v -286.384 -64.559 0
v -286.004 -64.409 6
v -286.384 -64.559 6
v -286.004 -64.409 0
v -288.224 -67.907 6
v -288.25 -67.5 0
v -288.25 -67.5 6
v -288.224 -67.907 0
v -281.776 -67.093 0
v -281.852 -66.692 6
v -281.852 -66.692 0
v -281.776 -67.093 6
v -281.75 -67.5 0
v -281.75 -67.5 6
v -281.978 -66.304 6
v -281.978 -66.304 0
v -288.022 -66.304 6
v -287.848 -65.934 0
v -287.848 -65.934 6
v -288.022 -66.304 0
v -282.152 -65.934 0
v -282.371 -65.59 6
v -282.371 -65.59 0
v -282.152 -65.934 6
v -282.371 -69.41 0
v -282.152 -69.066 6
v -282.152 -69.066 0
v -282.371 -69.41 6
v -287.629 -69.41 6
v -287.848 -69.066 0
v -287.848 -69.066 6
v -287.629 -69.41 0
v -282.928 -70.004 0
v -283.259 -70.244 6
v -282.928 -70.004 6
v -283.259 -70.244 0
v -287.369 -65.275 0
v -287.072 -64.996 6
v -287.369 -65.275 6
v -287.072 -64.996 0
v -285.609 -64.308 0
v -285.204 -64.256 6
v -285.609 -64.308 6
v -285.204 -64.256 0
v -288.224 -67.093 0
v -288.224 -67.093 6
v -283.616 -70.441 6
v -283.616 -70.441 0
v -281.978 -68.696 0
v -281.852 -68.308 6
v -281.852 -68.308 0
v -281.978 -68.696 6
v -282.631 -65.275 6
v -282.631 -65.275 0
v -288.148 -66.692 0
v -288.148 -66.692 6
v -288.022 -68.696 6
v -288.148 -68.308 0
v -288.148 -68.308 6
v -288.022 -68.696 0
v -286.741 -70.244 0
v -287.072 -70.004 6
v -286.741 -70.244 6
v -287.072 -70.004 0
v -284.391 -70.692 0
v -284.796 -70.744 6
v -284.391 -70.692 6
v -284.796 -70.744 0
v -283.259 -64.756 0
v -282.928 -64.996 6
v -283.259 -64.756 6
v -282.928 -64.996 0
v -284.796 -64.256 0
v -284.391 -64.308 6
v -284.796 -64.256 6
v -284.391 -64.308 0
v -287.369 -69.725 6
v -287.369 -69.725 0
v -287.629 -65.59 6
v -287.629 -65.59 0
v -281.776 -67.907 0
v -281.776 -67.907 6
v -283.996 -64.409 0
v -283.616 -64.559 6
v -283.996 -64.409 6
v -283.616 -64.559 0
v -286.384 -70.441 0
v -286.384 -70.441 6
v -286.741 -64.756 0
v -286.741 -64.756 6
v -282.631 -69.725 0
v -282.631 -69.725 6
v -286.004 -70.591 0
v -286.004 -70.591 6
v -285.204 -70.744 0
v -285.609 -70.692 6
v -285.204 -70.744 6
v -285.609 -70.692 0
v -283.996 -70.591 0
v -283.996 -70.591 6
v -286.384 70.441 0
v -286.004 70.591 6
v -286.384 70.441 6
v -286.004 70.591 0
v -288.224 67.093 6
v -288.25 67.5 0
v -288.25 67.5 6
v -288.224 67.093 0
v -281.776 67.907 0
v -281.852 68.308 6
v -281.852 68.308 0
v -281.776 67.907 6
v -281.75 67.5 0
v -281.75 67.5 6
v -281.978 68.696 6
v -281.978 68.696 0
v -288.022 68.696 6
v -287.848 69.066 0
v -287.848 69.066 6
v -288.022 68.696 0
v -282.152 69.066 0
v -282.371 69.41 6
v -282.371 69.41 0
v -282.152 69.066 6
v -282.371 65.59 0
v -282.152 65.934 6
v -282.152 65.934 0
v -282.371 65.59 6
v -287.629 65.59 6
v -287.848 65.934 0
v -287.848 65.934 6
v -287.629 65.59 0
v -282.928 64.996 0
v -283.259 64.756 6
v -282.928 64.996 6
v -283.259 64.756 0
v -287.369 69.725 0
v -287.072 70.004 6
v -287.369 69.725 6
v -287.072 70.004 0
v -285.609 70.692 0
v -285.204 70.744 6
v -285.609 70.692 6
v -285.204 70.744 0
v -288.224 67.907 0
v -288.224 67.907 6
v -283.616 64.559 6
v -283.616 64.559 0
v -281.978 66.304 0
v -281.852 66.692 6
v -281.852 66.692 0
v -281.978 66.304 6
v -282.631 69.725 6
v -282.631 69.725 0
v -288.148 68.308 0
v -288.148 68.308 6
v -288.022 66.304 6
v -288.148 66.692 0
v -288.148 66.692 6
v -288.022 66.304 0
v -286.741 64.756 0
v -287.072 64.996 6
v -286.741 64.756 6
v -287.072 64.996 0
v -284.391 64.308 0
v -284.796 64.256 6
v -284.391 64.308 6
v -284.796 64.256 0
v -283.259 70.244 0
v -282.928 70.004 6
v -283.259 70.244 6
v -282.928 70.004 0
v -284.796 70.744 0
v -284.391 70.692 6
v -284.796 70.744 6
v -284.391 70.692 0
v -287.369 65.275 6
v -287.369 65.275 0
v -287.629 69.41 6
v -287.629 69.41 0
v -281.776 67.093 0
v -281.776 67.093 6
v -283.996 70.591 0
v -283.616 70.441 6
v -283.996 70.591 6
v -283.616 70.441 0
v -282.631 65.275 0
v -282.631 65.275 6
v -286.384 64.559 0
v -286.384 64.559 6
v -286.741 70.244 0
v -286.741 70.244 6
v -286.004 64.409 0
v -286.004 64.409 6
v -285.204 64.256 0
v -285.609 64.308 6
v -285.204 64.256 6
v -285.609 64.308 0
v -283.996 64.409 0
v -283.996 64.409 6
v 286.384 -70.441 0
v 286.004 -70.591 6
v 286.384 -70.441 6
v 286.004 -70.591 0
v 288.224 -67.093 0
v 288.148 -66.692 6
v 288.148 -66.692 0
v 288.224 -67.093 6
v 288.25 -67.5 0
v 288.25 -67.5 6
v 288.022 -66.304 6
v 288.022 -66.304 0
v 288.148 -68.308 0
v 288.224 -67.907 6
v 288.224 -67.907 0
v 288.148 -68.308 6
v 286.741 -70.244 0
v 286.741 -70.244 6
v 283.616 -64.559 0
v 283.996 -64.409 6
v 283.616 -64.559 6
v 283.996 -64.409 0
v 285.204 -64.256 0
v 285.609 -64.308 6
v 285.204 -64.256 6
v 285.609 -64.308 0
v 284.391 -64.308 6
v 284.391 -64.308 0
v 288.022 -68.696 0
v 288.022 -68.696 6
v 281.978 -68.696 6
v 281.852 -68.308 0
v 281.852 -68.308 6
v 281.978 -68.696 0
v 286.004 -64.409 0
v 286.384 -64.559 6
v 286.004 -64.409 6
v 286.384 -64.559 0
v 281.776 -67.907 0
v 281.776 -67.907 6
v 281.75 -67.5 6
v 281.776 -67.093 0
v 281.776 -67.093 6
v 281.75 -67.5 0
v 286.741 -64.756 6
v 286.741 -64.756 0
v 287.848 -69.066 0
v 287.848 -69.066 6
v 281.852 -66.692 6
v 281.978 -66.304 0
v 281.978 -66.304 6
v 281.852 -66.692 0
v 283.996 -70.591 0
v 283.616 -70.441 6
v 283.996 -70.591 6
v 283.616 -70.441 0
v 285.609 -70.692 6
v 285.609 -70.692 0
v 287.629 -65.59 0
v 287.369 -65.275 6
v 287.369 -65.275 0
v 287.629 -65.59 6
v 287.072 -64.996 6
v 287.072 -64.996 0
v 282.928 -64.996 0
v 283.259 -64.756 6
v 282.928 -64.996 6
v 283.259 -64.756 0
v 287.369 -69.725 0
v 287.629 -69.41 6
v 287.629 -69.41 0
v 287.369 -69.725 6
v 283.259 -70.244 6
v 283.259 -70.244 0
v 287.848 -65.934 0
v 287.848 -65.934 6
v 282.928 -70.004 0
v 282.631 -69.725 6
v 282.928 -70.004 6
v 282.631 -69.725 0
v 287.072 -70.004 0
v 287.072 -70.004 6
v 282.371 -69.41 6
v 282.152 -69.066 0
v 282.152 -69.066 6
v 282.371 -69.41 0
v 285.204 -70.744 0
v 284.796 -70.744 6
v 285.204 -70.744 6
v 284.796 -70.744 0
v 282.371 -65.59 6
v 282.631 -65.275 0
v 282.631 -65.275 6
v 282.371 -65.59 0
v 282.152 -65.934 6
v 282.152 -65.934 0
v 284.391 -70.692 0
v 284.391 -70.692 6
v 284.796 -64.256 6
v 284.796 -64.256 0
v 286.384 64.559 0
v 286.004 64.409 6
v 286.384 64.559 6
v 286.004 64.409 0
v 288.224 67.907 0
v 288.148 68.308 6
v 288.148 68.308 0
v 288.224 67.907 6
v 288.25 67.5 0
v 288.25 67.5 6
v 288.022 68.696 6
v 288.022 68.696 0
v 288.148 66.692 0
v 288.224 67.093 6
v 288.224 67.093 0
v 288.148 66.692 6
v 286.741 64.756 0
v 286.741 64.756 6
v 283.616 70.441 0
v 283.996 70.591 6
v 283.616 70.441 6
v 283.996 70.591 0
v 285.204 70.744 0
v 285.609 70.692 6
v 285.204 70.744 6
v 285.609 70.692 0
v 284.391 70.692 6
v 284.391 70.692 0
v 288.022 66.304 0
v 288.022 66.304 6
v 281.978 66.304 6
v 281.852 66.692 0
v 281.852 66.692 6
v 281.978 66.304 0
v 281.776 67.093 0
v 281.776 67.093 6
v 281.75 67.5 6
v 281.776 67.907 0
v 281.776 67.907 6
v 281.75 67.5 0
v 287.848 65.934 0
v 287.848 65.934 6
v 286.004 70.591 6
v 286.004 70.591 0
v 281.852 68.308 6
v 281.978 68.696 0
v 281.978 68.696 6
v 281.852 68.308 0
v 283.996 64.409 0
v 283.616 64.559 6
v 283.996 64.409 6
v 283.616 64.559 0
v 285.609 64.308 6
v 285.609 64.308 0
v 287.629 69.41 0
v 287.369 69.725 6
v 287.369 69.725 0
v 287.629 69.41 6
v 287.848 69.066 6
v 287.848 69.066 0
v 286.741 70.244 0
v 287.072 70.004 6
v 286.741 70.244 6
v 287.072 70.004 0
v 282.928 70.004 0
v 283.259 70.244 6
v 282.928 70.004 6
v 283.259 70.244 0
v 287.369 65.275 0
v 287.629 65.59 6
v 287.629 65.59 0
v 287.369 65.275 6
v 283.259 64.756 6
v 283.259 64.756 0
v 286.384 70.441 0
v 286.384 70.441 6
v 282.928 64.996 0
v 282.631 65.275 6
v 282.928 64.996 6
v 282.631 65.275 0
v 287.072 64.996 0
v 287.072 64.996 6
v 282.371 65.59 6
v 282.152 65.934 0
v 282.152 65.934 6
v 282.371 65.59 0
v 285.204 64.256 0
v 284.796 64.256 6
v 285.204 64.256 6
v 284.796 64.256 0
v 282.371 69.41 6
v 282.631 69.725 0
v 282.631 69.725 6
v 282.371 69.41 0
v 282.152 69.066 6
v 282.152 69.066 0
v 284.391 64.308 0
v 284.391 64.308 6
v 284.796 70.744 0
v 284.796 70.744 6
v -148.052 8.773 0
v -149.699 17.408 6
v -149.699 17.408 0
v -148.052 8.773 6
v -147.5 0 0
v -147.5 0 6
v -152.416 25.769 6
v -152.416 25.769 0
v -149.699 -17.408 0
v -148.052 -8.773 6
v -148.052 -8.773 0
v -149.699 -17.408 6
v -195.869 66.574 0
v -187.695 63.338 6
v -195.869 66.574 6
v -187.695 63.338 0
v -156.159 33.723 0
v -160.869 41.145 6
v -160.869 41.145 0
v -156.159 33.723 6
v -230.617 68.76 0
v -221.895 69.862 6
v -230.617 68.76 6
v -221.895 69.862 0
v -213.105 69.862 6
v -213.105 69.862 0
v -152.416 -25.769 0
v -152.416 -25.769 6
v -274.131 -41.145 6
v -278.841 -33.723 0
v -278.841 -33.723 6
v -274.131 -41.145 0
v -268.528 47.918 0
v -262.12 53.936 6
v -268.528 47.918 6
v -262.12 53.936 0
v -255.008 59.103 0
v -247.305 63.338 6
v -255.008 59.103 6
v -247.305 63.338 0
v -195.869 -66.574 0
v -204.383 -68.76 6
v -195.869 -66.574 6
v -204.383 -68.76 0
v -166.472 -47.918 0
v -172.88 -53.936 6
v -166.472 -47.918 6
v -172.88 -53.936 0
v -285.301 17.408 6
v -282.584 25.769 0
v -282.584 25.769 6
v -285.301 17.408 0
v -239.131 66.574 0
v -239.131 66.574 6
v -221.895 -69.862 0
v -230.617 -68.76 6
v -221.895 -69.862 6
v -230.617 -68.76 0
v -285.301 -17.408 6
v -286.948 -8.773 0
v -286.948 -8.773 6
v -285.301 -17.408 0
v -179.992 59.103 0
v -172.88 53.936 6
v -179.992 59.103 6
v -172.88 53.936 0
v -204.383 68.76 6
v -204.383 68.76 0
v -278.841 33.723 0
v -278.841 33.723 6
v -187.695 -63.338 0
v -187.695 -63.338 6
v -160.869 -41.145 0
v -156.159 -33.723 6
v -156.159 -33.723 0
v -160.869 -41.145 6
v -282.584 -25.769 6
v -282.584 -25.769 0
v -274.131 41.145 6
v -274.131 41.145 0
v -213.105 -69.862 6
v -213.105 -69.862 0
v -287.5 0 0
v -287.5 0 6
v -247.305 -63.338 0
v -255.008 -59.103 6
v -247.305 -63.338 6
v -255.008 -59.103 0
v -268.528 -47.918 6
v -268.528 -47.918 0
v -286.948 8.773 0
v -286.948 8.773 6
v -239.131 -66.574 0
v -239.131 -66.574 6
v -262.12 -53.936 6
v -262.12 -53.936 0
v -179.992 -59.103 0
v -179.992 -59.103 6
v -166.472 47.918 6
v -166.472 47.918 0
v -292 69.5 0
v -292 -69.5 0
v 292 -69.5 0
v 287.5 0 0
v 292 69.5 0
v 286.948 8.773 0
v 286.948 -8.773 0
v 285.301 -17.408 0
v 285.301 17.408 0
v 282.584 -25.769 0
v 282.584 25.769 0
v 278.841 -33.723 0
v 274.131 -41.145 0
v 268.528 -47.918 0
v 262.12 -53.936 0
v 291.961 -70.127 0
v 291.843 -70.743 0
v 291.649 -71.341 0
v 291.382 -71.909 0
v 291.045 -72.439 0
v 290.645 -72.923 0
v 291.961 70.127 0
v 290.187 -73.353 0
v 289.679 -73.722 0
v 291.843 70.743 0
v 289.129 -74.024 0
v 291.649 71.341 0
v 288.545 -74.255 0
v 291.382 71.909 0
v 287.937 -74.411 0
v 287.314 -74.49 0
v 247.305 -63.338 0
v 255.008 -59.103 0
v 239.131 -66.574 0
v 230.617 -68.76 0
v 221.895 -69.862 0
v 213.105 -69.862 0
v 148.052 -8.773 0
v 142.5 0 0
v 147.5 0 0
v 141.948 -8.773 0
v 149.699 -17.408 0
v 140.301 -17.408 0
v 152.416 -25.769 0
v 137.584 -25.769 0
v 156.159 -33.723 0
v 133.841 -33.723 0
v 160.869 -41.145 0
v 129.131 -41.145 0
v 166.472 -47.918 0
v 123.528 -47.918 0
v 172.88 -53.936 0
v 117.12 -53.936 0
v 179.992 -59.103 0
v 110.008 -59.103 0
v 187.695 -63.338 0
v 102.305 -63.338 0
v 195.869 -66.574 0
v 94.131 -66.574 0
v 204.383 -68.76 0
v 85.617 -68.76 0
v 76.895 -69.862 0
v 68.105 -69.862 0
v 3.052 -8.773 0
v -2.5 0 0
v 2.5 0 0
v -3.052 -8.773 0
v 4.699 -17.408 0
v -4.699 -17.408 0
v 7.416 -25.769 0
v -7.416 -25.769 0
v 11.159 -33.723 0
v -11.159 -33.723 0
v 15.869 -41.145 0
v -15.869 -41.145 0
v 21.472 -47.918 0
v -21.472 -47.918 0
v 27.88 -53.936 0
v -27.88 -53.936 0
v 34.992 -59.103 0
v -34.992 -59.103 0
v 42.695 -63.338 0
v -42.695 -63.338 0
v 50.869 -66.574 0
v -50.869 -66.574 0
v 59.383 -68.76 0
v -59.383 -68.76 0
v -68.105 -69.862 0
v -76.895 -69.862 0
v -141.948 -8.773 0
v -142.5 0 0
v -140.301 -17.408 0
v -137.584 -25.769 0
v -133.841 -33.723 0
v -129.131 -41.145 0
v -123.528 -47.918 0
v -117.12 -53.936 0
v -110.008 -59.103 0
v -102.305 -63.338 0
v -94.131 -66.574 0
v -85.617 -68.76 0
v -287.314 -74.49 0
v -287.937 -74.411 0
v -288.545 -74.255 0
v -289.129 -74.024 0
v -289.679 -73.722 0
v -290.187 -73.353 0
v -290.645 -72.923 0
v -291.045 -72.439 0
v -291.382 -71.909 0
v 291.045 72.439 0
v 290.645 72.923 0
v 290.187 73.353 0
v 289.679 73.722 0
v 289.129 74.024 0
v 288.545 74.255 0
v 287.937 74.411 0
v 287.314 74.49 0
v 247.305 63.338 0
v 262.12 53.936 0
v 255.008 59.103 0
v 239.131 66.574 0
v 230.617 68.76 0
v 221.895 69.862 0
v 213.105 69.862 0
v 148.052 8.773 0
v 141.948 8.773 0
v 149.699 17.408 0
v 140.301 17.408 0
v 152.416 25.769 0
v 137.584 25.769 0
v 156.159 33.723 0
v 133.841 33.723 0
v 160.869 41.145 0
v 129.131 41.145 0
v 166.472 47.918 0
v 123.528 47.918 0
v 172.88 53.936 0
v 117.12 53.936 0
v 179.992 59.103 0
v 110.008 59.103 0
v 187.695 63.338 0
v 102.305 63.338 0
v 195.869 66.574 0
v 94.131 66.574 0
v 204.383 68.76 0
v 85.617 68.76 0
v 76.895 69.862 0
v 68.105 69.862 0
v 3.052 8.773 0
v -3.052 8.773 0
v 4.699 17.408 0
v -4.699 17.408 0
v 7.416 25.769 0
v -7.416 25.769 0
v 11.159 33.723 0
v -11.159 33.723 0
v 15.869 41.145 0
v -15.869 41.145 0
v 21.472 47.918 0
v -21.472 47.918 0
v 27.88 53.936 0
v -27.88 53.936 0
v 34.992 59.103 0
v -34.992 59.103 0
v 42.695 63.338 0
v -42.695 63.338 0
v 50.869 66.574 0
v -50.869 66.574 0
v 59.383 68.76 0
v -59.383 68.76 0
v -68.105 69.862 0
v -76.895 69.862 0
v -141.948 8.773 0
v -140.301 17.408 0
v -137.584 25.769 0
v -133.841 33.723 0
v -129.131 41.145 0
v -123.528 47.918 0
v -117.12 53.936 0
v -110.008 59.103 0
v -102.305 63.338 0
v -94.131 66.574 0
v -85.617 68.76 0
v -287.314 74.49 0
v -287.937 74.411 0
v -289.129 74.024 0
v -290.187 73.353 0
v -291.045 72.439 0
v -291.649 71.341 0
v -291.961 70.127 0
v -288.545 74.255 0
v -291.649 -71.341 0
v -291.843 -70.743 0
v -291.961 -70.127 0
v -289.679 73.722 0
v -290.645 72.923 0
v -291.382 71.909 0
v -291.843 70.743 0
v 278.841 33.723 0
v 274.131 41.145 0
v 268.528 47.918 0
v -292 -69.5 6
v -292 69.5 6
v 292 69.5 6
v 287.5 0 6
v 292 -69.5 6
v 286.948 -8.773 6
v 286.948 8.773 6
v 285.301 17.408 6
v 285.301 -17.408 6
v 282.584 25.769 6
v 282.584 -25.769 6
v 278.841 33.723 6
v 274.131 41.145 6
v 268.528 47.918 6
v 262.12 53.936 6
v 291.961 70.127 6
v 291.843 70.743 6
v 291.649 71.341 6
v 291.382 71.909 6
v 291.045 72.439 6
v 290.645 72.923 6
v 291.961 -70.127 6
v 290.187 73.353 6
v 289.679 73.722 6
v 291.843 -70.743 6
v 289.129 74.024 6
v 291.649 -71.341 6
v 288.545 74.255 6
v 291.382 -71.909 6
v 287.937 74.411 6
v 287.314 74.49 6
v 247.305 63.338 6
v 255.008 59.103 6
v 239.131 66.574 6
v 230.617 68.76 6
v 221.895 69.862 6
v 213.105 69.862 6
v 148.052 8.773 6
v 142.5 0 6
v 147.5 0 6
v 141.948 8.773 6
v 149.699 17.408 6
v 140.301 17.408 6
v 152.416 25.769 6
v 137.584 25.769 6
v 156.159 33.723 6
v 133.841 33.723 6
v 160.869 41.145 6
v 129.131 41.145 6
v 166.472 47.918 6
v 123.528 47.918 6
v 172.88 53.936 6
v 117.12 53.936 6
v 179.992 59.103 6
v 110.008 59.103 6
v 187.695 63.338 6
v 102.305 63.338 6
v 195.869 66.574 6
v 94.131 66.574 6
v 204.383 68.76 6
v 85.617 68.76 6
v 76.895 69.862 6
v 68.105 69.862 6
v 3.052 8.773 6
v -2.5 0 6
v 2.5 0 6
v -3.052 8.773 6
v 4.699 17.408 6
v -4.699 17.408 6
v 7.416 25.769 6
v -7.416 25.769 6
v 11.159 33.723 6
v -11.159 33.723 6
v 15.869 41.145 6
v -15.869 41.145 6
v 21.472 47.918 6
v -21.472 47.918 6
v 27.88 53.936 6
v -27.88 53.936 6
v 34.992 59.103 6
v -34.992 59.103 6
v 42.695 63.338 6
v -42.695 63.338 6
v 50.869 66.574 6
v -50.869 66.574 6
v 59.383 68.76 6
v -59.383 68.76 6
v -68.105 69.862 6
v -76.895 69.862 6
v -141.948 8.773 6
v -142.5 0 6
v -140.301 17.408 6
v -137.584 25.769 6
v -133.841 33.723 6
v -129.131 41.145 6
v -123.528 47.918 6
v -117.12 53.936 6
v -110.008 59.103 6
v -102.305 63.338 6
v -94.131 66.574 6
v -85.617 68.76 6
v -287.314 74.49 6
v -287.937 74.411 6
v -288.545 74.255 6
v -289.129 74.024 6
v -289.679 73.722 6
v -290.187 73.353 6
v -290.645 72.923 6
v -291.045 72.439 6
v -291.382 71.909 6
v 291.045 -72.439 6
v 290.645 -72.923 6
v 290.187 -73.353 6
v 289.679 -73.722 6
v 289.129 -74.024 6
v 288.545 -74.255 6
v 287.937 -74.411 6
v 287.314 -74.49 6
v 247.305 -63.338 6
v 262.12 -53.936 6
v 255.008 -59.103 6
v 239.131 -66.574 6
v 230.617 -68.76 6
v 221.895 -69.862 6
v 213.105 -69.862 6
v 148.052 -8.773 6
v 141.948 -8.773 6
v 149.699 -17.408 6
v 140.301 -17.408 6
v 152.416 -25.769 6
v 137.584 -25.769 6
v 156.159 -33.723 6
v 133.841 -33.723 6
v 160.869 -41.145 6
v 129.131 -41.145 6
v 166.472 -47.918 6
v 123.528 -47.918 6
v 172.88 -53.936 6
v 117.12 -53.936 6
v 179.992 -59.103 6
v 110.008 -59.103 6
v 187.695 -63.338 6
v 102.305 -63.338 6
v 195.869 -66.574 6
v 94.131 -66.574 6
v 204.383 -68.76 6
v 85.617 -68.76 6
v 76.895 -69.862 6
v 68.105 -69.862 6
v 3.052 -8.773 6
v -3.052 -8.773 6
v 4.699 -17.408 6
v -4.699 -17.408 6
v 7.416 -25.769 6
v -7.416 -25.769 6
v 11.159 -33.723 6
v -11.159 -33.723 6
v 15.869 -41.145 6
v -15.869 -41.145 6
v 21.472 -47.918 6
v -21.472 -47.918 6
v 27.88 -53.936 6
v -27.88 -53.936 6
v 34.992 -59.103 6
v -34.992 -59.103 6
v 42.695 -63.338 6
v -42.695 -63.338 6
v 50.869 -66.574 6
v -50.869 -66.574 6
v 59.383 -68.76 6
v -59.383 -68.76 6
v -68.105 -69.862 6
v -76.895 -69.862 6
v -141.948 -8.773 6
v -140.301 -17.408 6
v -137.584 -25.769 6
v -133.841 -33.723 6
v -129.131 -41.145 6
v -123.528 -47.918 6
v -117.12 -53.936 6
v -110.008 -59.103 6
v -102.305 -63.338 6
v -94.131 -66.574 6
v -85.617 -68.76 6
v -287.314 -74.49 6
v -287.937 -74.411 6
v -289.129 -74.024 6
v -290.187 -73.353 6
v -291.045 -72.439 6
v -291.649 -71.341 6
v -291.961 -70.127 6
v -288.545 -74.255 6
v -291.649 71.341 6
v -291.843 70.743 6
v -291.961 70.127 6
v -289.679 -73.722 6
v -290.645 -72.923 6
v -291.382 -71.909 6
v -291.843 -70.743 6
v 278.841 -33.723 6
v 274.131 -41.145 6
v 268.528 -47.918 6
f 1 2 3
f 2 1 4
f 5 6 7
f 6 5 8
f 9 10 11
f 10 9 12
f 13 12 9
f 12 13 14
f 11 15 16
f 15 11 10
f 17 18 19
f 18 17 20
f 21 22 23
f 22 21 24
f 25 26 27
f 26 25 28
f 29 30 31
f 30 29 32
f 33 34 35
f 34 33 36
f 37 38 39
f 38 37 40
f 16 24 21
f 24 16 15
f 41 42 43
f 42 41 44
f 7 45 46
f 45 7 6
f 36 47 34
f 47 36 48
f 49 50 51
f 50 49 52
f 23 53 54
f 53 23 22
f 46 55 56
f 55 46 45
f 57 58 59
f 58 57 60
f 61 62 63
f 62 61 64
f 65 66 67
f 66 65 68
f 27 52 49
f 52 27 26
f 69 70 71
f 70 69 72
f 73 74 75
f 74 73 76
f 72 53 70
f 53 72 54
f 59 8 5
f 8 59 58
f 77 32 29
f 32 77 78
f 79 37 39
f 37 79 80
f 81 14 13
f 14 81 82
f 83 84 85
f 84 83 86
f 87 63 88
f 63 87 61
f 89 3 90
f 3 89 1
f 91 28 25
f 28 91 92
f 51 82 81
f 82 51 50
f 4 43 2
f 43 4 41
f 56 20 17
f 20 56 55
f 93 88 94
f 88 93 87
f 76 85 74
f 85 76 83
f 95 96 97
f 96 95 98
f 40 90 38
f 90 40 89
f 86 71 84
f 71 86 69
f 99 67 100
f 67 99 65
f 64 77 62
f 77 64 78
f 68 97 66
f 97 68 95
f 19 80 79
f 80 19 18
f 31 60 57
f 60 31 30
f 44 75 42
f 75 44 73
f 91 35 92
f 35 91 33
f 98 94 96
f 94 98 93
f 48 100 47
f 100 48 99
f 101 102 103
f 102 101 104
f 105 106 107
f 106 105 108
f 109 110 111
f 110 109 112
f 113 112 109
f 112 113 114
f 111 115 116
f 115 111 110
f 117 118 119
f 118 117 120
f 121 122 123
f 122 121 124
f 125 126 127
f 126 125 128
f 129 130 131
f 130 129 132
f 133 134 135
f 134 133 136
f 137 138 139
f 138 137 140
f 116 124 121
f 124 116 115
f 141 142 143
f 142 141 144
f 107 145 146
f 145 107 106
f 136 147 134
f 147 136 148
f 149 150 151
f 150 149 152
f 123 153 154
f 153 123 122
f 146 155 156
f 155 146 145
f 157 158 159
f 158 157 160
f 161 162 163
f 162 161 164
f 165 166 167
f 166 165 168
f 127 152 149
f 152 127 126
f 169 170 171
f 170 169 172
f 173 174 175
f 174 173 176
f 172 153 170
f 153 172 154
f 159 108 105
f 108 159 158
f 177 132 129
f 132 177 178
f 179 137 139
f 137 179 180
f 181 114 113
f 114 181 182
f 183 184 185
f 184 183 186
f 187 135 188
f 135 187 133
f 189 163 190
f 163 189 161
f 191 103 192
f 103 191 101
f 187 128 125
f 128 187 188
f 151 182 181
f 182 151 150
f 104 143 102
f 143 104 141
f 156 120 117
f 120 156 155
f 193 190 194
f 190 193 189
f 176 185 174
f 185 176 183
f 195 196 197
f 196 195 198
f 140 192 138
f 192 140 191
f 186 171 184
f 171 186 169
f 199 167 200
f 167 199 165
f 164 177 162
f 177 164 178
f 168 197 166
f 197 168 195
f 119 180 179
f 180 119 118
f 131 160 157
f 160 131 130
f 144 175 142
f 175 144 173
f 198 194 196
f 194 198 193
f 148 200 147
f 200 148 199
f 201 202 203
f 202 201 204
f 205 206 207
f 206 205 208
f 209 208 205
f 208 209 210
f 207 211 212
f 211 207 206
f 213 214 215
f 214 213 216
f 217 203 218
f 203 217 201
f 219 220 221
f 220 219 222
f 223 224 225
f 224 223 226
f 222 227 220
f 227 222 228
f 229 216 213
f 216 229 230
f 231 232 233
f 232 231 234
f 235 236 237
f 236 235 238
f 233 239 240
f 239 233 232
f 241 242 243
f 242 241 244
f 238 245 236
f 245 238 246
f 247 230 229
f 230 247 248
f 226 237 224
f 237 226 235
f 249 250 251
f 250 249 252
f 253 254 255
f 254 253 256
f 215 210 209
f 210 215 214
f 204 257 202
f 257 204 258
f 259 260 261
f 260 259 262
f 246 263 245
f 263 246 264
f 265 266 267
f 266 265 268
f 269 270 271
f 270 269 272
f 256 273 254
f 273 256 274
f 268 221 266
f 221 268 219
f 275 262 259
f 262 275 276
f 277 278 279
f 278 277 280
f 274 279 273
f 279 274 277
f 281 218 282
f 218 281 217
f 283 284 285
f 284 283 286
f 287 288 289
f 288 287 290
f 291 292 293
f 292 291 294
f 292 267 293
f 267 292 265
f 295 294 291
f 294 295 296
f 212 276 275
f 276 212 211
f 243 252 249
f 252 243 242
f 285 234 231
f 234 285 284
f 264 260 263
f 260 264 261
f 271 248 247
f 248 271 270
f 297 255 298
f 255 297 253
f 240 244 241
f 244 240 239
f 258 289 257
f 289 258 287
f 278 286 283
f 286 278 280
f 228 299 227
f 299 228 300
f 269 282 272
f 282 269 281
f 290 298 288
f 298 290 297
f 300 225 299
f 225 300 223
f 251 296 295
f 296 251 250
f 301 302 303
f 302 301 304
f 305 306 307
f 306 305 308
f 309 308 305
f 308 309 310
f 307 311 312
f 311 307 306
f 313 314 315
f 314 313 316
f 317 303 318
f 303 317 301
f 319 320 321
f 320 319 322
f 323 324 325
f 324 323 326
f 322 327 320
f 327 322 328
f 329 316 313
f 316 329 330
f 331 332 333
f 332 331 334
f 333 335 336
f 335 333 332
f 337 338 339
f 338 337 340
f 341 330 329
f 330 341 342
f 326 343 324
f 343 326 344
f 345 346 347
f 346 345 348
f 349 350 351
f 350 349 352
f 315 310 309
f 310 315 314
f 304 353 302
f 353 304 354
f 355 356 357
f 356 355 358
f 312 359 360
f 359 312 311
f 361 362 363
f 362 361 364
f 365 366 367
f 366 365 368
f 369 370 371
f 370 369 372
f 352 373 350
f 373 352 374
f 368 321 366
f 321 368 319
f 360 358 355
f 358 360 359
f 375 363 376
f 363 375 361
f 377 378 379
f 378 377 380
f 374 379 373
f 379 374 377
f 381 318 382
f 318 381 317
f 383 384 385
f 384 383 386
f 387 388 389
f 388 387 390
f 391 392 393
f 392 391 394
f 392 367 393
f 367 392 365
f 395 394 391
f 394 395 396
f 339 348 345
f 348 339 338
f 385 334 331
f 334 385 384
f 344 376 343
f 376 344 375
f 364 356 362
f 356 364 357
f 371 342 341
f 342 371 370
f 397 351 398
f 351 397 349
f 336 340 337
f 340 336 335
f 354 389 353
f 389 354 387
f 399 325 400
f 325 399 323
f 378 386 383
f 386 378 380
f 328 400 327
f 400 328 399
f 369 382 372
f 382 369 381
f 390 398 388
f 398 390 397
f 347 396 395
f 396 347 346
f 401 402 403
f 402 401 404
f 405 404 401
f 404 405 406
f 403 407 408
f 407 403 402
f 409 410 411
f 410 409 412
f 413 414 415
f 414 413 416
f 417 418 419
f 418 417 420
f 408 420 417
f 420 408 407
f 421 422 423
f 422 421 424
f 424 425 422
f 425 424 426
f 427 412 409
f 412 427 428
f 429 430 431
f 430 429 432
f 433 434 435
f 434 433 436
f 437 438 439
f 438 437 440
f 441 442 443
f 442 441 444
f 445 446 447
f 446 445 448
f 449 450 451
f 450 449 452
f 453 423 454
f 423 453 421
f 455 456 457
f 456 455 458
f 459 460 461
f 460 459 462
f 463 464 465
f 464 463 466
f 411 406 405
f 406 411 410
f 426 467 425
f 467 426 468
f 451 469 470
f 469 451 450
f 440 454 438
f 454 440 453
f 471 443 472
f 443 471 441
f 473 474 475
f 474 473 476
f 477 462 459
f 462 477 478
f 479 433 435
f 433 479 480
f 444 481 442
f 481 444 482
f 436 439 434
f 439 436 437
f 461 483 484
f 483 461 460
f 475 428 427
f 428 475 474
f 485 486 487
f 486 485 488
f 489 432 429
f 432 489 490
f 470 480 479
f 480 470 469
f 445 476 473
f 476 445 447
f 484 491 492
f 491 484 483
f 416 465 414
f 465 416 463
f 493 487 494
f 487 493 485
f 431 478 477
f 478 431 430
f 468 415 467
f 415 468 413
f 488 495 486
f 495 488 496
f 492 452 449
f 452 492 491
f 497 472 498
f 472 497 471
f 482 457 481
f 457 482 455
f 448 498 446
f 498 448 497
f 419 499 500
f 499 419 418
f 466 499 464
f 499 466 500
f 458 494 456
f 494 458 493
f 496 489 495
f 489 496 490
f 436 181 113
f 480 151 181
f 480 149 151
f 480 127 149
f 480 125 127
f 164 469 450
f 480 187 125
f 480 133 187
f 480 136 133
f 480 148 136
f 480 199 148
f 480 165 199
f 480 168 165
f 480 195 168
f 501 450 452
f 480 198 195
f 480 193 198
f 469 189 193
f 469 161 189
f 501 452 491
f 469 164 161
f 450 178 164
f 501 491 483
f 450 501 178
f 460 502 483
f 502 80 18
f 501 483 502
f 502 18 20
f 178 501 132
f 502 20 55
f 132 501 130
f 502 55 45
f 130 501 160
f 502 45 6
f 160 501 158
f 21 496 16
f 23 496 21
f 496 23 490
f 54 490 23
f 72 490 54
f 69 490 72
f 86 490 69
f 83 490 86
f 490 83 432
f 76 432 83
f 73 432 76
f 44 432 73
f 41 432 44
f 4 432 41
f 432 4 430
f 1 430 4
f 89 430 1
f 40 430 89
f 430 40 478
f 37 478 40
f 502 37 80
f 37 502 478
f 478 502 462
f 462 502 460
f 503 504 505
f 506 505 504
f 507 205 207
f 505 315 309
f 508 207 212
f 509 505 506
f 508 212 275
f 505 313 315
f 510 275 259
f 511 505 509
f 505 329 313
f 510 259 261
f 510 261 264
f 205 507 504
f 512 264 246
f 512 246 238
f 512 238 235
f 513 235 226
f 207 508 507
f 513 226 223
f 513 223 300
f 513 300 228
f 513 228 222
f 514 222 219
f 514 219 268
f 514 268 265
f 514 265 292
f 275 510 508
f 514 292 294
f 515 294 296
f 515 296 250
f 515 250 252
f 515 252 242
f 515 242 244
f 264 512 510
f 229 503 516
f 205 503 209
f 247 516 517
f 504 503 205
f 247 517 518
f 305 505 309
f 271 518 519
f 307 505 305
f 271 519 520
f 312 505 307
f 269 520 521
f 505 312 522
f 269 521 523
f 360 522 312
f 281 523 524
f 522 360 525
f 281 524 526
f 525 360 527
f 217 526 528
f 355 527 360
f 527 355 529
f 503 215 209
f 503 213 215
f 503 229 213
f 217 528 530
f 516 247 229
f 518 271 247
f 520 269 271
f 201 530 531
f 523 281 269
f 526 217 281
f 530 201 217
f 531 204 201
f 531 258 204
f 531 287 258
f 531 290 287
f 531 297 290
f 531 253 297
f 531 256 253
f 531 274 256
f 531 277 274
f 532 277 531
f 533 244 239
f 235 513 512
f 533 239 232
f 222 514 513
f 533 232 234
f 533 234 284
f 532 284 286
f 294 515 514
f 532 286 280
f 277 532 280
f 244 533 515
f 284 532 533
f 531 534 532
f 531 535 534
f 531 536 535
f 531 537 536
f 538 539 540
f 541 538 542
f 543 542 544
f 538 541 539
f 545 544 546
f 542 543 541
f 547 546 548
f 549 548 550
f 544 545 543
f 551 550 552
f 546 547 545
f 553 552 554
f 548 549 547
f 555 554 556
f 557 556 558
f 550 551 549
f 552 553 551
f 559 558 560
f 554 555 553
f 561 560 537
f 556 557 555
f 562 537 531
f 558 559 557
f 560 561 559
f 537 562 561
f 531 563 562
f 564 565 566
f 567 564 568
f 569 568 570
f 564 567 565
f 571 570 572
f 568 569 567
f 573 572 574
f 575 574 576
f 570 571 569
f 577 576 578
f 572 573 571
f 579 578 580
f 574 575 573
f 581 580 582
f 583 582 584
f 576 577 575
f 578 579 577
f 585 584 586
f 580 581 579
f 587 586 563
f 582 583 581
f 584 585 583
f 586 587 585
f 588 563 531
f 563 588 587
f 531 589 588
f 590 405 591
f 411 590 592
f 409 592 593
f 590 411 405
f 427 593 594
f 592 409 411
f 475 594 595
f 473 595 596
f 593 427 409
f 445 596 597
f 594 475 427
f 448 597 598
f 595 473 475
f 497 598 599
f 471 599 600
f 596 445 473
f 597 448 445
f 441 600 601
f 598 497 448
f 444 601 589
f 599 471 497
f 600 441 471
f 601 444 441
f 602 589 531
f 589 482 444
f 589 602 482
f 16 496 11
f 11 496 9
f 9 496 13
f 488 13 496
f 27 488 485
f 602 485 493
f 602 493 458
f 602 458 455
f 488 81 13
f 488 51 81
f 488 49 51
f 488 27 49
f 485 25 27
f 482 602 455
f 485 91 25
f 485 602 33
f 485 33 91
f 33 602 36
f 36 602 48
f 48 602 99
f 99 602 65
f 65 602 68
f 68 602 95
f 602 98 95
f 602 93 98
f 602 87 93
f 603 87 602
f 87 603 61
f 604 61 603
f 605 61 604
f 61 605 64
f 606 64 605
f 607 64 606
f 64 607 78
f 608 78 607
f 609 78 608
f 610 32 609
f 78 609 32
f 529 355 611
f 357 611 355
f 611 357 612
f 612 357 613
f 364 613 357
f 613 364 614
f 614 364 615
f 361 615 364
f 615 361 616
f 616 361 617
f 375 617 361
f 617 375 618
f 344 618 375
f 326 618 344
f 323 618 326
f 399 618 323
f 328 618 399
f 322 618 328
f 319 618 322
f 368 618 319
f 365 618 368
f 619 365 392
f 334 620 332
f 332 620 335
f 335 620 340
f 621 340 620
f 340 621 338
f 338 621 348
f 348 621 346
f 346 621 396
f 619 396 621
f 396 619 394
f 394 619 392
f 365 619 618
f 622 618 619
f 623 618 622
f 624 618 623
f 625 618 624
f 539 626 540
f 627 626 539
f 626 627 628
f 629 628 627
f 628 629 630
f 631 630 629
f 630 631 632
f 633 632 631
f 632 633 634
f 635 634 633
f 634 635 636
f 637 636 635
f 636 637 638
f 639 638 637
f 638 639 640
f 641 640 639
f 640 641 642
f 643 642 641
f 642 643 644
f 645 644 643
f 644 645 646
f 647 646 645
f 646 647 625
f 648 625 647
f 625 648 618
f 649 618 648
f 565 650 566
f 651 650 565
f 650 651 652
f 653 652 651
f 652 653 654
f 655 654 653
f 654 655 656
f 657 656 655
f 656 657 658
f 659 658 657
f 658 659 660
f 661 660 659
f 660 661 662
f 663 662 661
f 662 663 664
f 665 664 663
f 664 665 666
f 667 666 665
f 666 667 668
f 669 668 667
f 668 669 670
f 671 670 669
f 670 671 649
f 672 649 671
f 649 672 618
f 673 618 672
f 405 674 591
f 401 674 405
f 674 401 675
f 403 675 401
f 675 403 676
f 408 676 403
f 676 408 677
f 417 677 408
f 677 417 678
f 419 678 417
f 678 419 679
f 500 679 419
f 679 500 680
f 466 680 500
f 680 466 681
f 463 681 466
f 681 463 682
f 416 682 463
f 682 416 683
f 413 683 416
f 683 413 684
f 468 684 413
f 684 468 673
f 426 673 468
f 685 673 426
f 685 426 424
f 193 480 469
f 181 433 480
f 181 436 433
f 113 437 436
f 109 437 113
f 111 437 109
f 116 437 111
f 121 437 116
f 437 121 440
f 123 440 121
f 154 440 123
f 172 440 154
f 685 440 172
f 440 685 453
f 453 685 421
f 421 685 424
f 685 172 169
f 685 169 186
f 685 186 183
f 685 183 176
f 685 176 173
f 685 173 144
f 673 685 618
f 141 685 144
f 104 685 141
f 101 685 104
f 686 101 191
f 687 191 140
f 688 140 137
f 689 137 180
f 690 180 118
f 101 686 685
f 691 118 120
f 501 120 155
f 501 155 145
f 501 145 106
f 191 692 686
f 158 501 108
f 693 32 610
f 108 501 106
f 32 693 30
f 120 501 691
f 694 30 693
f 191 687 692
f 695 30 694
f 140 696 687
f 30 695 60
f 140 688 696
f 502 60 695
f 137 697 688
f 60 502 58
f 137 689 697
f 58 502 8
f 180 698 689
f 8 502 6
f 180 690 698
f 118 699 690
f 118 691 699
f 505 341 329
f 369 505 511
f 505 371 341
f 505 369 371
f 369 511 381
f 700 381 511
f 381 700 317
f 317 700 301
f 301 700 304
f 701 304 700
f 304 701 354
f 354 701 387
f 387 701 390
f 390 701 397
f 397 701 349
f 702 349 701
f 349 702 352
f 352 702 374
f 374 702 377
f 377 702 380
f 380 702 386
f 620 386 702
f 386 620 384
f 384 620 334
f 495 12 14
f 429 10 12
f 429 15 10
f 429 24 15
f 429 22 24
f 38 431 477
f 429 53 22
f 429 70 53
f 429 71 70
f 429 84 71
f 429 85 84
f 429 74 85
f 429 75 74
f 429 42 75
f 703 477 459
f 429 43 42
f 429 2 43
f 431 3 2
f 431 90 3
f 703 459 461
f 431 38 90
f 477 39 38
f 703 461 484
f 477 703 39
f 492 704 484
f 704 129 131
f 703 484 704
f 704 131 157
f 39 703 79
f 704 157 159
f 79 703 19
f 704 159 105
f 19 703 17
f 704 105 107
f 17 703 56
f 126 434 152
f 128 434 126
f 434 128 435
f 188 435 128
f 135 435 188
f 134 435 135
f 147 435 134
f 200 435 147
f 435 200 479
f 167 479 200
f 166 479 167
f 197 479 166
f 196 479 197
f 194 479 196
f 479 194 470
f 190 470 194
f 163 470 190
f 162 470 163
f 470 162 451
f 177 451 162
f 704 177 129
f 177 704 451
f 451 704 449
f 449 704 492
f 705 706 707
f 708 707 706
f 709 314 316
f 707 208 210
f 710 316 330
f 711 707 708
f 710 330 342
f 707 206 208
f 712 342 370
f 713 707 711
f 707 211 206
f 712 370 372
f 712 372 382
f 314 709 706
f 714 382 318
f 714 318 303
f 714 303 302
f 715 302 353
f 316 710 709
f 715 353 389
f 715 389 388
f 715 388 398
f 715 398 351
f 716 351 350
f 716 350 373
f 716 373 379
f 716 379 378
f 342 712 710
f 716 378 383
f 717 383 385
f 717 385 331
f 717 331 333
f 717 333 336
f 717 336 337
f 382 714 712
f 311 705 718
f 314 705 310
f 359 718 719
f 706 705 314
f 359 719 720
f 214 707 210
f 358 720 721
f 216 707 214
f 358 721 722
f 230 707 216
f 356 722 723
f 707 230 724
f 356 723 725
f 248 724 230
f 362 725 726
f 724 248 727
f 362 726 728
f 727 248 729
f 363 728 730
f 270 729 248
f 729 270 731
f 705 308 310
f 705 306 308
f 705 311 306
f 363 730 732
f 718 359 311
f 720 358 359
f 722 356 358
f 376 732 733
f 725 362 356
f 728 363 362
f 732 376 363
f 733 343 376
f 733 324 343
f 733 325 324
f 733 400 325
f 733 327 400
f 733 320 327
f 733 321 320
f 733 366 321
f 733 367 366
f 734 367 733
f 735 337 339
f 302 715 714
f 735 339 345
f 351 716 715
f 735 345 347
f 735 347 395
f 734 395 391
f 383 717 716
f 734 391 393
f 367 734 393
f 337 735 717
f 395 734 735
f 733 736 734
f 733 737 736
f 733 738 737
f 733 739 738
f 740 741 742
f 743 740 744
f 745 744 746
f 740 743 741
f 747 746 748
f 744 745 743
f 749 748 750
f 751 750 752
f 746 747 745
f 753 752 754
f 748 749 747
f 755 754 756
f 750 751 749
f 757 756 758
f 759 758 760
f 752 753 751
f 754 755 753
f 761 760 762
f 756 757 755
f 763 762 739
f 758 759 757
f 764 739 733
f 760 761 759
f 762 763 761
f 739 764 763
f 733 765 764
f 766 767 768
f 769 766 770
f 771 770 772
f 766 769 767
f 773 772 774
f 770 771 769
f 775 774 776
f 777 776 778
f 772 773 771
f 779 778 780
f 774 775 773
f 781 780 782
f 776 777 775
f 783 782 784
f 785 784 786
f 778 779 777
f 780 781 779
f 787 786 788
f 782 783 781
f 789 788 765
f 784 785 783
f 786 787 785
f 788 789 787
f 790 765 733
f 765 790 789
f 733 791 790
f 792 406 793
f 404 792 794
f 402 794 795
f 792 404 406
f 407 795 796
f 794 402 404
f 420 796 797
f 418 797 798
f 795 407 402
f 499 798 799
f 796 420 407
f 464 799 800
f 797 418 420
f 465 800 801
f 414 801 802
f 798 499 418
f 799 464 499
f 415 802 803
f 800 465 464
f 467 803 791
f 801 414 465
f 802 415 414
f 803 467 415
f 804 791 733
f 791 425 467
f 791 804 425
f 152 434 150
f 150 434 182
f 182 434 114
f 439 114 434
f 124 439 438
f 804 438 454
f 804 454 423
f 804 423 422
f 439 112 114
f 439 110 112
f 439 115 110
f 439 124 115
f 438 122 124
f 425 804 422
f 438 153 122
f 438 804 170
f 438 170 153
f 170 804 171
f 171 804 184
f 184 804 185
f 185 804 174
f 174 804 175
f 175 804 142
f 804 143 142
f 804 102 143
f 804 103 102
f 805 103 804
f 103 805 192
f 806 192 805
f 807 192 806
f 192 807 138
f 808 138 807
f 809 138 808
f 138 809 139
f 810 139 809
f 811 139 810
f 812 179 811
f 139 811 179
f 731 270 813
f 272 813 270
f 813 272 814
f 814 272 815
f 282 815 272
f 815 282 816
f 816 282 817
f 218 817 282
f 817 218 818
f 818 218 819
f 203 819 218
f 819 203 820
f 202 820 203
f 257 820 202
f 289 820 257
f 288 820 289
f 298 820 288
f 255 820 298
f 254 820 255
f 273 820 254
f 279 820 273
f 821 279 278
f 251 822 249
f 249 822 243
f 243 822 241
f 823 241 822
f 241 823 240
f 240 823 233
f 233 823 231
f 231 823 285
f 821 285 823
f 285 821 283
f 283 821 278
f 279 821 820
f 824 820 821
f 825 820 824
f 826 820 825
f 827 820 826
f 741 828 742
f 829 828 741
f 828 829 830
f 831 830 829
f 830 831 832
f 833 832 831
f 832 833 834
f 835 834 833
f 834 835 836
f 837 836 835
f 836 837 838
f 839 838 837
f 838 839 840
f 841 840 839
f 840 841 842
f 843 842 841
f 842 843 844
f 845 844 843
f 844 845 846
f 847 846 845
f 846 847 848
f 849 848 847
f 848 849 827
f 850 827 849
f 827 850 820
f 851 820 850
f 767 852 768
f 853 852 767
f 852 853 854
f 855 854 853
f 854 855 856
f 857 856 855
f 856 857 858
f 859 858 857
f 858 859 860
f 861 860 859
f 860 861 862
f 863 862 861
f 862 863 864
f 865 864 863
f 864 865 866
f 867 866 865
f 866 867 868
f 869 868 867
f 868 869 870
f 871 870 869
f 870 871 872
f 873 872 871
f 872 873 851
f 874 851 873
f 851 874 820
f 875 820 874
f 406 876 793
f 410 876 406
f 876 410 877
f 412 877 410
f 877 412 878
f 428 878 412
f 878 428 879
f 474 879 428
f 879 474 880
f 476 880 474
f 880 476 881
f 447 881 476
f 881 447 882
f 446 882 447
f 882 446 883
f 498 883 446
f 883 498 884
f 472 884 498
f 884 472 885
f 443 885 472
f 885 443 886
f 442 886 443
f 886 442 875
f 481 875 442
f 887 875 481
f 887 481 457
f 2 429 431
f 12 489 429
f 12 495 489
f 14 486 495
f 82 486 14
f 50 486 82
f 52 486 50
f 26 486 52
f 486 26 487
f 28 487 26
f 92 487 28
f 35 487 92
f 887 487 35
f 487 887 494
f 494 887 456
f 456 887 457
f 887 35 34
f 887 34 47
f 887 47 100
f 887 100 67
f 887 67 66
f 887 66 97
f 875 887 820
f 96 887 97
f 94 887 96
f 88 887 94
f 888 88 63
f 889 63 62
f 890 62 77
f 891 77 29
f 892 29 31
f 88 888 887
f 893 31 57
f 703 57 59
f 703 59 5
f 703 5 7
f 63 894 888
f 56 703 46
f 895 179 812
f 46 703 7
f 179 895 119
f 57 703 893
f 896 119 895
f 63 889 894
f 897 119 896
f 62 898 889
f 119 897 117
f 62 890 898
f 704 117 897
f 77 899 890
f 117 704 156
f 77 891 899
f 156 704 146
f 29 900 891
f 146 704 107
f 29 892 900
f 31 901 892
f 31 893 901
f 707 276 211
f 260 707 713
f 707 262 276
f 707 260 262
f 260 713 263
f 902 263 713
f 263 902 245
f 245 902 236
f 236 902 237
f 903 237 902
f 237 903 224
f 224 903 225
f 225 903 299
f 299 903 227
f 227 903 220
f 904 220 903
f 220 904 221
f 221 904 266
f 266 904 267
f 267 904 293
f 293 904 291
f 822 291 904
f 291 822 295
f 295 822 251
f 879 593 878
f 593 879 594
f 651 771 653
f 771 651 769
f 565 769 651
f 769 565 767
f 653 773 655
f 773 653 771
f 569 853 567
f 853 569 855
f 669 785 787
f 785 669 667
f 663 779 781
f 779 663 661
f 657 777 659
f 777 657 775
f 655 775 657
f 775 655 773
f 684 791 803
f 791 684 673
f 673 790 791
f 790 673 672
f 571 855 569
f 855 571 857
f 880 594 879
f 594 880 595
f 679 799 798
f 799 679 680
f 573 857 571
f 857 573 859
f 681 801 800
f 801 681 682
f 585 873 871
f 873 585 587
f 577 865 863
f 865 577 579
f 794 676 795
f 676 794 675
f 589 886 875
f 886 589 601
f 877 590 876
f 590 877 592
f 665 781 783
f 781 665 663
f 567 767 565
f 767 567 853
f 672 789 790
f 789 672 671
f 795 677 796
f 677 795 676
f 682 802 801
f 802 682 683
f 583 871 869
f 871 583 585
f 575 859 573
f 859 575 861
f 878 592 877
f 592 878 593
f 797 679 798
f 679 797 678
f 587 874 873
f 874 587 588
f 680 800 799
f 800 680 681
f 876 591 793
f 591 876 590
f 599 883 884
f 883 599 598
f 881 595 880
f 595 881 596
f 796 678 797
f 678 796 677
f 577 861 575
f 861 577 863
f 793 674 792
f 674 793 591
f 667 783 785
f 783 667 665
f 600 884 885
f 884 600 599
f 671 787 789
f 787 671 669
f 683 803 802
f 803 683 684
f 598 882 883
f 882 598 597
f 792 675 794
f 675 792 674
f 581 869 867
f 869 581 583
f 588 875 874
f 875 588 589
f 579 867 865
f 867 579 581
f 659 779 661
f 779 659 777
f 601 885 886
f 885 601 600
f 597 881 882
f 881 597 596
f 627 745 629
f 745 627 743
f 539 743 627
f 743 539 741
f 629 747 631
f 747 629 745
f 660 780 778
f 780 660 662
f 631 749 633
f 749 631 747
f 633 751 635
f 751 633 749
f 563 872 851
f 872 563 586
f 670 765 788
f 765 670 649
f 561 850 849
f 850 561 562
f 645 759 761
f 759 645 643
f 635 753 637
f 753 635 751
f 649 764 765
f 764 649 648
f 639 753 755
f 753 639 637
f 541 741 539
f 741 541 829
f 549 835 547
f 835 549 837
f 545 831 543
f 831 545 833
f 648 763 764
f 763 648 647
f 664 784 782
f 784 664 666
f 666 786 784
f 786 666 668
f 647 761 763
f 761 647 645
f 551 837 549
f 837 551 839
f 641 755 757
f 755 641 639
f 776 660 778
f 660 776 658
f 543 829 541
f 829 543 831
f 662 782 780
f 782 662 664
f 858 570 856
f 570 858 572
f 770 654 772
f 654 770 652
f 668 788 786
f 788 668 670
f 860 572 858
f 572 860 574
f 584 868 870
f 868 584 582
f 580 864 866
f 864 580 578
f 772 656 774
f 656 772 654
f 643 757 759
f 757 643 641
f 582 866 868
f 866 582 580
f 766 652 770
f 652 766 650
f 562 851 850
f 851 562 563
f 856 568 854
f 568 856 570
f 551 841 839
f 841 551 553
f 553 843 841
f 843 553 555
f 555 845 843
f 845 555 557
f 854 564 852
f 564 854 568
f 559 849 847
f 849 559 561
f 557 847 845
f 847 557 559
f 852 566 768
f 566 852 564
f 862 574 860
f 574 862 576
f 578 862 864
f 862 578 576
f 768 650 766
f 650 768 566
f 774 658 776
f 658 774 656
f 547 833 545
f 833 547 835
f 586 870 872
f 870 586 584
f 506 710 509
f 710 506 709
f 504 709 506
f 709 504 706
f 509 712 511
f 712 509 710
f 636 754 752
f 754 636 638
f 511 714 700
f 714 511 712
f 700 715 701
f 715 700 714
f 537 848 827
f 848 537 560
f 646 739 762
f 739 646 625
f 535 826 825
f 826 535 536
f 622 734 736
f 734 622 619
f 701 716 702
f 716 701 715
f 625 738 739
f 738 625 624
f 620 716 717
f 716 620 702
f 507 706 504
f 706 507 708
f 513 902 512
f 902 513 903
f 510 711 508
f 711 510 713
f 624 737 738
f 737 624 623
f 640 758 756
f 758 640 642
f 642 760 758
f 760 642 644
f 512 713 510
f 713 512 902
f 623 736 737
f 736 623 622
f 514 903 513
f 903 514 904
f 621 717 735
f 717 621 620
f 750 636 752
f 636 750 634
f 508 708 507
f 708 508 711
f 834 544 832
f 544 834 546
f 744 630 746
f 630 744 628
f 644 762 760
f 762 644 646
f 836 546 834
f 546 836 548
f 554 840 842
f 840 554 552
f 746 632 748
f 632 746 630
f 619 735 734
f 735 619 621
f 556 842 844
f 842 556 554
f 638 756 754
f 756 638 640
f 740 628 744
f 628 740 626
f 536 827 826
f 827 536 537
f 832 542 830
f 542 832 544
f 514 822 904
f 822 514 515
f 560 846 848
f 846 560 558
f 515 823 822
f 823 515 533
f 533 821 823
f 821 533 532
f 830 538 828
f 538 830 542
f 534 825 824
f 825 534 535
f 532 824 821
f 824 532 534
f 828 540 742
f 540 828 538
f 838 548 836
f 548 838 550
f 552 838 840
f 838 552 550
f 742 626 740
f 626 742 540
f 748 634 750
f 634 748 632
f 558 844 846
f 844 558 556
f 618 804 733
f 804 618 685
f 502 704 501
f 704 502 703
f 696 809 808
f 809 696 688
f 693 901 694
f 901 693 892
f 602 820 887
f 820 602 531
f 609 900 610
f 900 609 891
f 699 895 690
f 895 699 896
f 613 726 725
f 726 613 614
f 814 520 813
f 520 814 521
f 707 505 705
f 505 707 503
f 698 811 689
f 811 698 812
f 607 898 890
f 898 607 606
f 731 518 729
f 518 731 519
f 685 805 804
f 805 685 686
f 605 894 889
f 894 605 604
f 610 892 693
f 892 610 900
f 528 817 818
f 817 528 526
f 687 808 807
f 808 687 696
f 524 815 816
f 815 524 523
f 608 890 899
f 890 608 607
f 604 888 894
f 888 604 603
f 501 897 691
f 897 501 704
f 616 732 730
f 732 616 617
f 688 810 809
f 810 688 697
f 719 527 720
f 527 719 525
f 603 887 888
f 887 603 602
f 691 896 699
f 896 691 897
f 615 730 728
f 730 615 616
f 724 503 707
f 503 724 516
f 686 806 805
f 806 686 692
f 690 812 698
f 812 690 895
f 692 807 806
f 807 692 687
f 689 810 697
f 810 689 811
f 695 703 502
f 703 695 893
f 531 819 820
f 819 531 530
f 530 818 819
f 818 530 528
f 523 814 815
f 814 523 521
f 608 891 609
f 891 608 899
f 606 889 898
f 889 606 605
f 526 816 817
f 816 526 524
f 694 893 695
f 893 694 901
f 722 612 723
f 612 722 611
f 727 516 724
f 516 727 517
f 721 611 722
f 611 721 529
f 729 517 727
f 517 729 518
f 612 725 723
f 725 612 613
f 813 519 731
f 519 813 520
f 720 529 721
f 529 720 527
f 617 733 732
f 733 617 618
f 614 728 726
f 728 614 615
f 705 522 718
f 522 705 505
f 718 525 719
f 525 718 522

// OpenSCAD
$fn = 50;

difference() {
	union() {
		hull() {
			translate(v = [-287.0, 69.5, 0]) {
				cylinder(h = 6, r = 5);
			}
			translate(v = [287.0, 69.5, 0]) {
				cylinder(h = 6, r = 5);
			}
			translate(v = [-287.0, -69.5, 0]) {
				cylinder(h = 6, r = 5);
			}
			translate(v = [287.0, -69.5, 0]) {
				cylinder(h = 6, r = 5);
			}
		}
	}
	union() {
		translate(v = [-285.0, -67.5, -100.0]) {
			cylinder(h = 200, r = 3.25);
		}
		translate(v = [-285.0, 67.5, -100.0]) {
			cylinder(h = 200, r = 3.25);
		}
		translate(v = [285.0, -67.5, -100.0]) {
			cylinder(h = 200, r = 3.25);
		}
		translate(v = [285.0, 67.5, -100.0]) {
			cylinder(h = 200, r = 3.25);
		}
		translate(v = [-285.0, -67.5, -100.0]) {
			cylinder(h = 200, r = 1.8);
		}
		translate(v = [-285.0, 67.5, -100.0]) {
			cylinder(h = 200, r = 1.8);
		}
		translate(v = [285.0, -67.5, -100.0]) {
			cylinder(h = 200, r = 1.8);
		}
		translate(v = [285.0, 67.5, -100.0]) {
			cylinder(h = 200, r = 1.8);
		}
		translate(v = [-217.5, 0, 0.0]) {
			cylinder(h = 6, r = 70.0);
		}
		translate(v = [-72.5, 0, 0.0]) {
			cylinder(h = 6, r = 70.0);
		}
		translate(v = [72.5, 0, 0.0]) {
			cylinder(h = 6, r = 70.0);
		}
		translate(v = [217.5, 0, 0.0]) {
			cylinder(h = 6, r = 70.0);
		}
	}
}
